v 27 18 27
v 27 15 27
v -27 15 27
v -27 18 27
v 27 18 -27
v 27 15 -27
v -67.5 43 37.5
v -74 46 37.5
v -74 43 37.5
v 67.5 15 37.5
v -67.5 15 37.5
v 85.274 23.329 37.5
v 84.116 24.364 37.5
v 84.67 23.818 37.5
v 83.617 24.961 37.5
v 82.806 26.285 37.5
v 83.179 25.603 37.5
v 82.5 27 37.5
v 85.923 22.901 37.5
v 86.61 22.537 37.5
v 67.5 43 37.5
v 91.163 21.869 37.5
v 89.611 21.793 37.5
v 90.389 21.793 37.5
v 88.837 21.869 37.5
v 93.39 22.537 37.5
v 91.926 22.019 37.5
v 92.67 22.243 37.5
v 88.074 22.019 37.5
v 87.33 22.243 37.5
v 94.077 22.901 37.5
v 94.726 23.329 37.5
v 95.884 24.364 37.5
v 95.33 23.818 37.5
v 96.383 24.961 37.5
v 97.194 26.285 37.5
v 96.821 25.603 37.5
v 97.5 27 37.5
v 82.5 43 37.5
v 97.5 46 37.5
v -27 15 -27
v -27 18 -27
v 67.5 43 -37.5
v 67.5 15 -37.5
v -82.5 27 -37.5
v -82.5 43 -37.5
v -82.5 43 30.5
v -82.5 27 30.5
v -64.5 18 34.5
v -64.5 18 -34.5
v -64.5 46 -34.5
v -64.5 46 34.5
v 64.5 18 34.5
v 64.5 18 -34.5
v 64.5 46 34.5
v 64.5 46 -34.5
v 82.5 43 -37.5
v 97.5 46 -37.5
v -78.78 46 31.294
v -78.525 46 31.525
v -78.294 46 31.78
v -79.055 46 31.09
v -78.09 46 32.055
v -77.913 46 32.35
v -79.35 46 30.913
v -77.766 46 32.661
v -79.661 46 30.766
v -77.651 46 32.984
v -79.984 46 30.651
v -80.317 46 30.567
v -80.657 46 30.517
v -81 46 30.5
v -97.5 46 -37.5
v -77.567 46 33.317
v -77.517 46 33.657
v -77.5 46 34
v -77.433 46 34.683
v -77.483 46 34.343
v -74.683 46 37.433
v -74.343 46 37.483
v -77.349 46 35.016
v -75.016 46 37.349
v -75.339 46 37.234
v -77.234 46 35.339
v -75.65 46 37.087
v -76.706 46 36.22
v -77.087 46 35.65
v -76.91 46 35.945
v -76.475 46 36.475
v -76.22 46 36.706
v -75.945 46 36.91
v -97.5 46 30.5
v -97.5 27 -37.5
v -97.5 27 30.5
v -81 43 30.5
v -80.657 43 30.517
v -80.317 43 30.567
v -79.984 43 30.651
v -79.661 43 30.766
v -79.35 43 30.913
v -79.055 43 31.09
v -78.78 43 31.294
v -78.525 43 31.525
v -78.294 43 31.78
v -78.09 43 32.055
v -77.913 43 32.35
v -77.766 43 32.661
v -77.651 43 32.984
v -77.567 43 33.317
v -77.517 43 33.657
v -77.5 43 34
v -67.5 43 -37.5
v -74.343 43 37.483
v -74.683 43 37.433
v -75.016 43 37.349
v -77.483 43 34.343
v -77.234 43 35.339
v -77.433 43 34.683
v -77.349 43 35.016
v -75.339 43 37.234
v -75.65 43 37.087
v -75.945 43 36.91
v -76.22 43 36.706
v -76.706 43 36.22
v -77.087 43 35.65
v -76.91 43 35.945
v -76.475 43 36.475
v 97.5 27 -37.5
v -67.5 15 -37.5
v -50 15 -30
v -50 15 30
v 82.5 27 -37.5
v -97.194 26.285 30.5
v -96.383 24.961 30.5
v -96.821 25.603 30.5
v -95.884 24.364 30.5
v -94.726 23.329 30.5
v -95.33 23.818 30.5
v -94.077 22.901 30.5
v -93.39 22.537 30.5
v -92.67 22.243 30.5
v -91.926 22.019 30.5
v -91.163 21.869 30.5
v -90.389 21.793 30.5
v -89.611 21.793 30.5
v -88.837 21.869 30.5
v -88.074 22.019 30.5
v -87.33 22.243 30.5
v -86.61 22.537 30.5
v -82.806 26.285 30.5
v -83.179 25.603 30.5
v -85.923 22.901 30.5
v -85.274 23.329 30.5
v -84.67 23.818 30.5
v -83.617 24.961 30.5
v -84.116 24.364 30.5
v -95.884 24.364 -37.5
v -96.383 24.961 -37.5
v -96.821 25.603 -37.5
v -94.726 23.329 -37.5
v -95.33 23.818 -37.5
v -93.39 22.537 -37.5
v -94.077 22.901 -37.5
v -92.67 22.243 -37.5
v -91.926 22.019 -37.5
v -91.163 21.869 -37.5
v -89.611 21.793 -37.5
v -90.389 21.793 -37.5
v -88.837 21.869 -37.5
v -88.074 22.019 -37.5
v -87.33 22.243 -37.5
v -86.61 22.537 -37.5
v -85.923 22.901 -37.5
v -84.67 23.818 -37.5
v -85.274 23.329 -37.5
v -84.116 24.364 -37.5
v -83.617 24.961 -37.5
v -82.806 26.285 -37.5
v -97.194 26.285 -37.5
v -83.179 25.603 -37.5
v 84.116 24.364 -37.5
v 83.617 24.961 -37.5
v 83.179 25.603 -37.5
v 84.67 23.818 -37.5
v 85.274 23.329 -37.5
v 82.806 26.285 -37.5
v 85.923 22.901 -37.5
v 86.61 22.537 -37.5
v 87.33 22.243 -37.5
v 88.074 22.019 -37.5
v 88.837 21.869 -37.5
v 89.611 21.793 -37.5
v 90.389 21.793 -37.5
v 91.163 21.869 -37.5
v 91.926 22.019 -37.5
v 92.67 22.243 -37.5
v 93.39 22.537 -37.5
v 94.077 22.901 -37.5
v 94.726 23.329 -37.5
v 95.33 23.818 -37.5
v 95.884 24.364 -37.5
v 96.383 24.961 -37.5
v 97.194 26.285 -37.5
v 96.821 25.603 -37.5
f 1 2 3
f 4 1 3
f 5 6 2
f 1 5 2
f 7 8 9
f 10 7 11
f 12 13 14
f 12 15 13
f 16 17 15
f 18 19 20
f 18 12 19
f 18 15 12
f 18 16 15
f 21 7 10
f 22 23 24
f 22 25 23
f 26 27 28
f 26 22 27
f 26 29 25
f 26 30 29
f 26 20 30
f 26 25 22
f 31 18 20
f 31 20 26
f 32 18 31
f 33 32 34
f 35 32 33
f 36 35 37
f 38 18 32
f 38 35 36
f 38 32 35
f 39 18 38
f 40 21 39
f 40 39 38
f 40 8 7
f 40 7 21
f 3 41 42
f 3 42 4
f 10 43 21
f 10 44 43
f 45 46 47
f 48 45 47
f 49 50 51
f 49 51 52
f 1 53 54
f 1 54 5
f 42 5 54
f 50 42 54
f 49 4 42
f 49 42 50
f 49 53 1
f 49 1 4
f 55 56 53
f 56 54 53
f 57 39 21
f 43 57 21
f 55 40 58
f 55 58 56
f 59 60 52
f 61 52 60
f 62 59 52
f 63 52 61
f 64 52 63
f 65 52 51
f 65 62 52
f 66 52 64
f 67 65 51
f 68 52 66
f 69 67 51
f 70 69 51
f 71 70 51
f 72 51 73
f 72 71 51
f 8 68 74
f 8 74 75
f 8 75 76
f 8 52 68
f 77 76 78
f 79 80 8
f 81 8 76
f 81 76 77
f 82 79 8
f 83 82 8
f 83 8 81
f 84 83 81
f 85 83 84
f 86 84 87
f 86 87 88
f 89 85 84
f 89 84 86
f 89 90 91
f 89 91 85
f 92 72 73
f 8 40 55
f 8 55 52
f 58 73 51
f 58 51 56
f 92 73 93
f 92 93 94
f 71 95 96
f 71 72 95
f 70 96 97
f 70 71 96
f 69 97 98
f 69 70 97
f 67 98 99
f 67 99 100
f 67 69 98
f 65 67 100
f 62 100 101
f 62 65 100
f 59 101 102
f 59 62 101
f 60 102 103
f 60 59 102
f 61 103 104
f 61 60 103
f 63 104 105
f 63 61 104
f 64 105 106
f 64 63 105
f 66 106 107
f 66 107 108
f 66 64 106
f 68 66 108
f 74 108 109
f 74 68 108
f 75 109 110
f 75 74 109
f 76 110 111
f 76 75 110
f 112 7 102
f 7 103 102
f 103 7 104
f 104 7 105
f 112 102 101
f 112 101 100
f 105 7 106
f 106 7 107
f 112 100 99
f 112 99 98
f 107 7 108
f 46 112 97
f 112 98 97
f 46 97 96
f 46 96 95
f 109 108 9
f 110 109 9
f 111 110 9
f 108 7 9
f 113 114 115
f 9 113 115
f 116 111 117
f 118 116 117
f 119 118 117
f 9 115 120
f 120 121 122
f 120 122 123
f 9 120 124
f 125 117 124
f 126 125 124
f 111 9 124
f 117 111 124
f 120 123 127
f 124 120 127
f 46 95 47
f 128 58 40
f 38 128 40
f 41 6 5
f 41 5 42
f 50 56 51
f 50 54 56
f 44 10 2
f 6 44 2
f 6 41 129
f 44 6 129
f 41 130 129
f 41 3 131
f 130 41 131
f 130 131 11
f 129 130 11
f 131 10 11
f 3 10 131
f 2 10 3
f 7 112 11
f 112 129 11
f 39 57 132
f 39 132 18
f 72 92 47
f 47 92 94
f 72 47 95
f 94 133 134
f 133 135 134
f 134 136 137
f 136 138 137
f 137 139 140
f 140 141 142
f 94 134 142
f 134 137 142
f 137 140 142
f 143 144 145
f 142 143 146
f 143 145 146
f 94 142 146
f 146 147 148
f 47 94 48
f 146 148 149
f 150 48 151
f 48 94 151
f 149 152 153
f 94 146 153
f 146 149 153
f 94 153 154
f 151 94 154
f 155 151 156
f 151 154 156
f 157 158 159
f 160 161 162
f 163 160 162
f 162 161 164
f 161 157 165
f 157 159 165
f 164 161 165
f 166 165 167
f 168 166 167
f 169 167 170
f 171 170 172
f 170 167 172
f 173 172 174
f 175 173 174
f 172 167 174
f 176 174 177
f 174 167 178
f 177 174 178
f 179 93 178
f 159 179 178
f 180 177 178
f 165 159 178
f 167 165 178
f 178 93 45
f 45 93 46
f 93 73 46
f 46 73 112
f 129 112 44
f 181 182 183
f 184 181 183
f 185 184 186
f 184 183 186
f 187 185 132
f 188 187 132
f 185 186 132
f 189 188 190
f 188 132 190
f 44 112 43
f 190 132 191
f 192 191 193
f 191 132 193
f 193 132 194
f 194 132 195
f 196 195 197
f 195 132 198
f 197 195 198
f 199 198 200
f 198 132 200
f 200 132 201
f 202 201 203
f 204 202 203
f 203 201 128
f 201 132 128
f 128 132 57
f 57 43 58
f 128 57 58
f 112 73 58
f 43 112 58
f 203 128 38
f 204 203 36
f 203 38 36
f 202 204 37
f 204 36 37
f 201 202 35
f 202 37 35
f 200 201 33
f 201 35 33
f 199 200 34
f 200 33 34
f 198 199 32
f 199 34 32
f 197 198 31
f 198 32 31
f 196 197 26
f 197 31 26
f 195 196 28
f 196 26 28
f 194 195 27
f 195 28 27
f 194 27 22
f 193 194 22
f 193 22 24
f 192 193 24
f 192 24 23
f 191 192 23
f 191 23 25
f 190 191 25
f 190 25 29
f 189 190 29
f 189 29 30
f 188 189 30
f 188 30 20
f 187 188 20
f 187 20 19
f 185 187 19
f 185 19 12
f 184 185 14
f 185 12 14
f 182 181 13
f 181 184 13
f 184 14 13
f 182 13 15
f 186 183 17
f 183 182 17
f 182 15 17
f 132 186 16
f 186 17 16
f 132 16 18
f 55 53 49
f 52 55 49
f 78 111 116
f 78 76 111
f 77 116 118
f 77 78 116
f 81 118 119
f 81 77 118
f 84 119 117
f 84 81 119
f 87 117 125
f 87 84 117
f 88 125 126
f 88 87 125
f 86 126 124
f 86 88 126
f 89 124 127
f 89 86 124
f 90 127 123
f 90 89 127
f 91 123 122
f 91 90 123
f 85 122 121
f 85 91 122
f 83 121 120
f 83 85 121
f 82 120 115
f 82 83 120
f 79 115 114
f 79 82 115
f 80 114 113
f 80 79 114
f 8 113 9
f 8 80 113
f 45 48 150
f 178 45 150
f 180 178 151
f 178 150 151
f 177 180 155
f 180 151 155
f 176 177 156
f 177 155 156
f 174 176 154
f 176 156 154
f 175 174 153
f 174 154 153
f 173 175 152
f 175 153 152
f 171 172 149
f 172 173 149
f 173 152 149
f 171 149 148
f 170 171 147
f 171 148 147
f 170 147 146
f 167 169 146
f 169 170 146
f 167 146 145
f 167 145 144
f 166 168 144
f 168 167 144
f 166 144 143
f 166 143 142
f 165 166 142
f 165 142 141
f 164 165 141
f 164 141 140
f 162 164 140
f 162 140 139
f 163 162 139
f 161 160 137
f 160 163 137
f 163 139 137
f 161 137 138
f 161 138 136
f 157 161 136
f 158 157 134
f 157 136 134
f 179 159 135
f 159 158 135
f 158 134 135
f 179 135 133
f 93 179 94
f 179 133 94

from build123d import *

# Parameters (mm, degrees)
F0_W      = 60
F0_H      = 60
F0_R      = 22.4096796893
F1_DEPTH  = 3
F2_W      = 60
F2_H      = 60
F2_W_2    = 54
F2_H_2    = 54
F3_DEPTH  = 15
F4_W      = 135
F4_H      = 75
F4_W_2    = 54
F4_H_2    = 54
F5_DEPTH  = 3
F6_W      = 135
F6_H      = 75
F6_W_2    = 129
F6_H_2    = 69
F7_DEPTH  = 25
F8_W      = 195
F8_H      = 75
F8_W_2    = 129
F8_H_2    = 69
F9_DEPTH  = 3
F10_W     = 15
F10_H     = 68
F11_DEPTH = 25
F12_W     = 15
F12_H     = 75
F13_DEPTH = 25
F15_DEPTH = 200
F17_DEPTH = 25
F18_R     = 3.49999
F21_DEPTH = 60
F24_W     = 60
F24_H     = 60
F25_DEPTH = 18


# Not quite as in the source:
# - a fillet or chamfer is up to 0.001 mm smaller than in the source, because OpenCascade refuses the exact size


with BuildPart() as f1:
    # F0 (on Front) → F1 (new body)
    with BuildSketch(Plane.XZ):
        Rectangle(F0_W, F0_H)
        Circle(F0_R, mode=Mode.SUBTRACT)
    extrude(amount=F1_DEPTH)

    # F2 (on face) → F3 (join)
    with BuildSketch(Plane(origin=(0, 0, 0), x_dir=(-1, 0, 0), z_dir=(0, 1, 0))):
        Rectangle(F2_W, F2_H)
        Rectangle(F2_W_2, F2_H_2, mode=Mode.SUBTRACT)
    extrude(amount=F3_DEPTH)

    # F4 (on face) → F5 (join)
    with BuildSketch(Plane(origin=(0, 15, 0), x_dir=(-1, 0, 0), z_dir=(0, 1, 0))):
        Rectangle(F4_W, F4_H)
        Rectangle(F4_W_2, F4_H_2, mode=Mode.SUBTRACT)
    extrude(amount=F5_DEPTH)

    # F6 (on face) → F7 (join)
    with BuildSketch(Plane(origin=(0, 18, 0), x_dir=(-1, 0, 0), z_dir=(0, 1, 0))):
        Rectangle(F6_W, F6_H)
        Rectangle(F6_W_2, F6_H_2, mode=Mode.SUBTRACT)
    extrude(amount=F7_DEPTH)

    # F8 (on face) → F9 (join)
    with BuildSketch(Plane(origin=(0, 43, 0), x_dir=(-1, 0, 0), z_dir=(0, 1, 0))):
        Rectangle(F8_W, F8_H)
        Rectangle(F8_W_2, F8_H_2, mode=Mode.SUBTRACT)
    extrude(amount=F9_DEPTH)

    # F10 (on face) → F11 (join)
    with BuildSketch(Plane.XZ.offset(-43)):
        with Locations((-90, -3.5)):
            Rectangle(F10_W, F10_H)
    extrude(amount=F11_DEPTH)

    # F12 (on face) → F13 (join)
    with BuildSketch(Plane.XZ.offset(-43)):
        with Locations((90, 0)):
            Rectangle(F12_W, F12_H)
    extrude(amount=F13_DEPTH)

    # F14 (on face) → F15 (cut)
    with BuildSketch(Plane.XY.offset(37.5)):
        with BuildLine():
            ThreePointArc((-82.5, 27), (-90, 21.7838821814), (-97.5, 27))
            Line((-97.5, 27), (-97.5, 18))
            Line((-97.5, 18), (-82.5, 18))
            Line((-82.5, 18), (-82.5, 27))
        make_face()
        with BuildLine():
            ThreePointArc((97.5, 27), (90, 21.7838821814), (82.5, 27))
            Line((82.5, 27), (82.5, 18))
            Line((82.5, 18), (97.5, 18))
            Line((97.5, 18), (97.5, 27))
        make_face()
    extrude(amount=-F15_DEPTH, mode=Mode.SUBTRACT)

    # F16 (on face) → F17 (cut)
    with BuildSketch(Plane.XZ.offset(-43)):
        Polygon((-77.5, 37.5), (-82.5, 37.5), (-97.5, 37.5), (-97.5, 30.5), (-82.5, 30.5), (-77.5, 30.5), align=None)
    extrude(amount=-F17_DEPTH, mode=Mode.SUBTRACT)

    # F18 (radius 3.5 in the source; OpenCascade refuses exactly that, so slightly less here)
    f18_edges = [f1.edges().sort_by_distance(p)[0] for p in [
        (-77.5, 44.5, 30.5),
        (-77.5, 44.5, 37.5),
    ]]
    fillet(f18_edges, radius=F18_R)

    # F20 (on face) → F21 (cut)
    with BuildSketch(Plane.XY.offset(30)):
        Polygon((-30, -3), (-50, 15), (-50, -3), align=None)
    extrude(amount=-F21_DEPTH, mode=Mode.SUBTRACT)

    # F24 (on face) → F25 (cut)
    with BuildSketch(Plane.XZ.offset(3)):
        Rectangle(F24_W, F24_H)
    extrude(amount=-F25_DEPTH, mode=Mode.SUBTRACT)


solid = f1.part
